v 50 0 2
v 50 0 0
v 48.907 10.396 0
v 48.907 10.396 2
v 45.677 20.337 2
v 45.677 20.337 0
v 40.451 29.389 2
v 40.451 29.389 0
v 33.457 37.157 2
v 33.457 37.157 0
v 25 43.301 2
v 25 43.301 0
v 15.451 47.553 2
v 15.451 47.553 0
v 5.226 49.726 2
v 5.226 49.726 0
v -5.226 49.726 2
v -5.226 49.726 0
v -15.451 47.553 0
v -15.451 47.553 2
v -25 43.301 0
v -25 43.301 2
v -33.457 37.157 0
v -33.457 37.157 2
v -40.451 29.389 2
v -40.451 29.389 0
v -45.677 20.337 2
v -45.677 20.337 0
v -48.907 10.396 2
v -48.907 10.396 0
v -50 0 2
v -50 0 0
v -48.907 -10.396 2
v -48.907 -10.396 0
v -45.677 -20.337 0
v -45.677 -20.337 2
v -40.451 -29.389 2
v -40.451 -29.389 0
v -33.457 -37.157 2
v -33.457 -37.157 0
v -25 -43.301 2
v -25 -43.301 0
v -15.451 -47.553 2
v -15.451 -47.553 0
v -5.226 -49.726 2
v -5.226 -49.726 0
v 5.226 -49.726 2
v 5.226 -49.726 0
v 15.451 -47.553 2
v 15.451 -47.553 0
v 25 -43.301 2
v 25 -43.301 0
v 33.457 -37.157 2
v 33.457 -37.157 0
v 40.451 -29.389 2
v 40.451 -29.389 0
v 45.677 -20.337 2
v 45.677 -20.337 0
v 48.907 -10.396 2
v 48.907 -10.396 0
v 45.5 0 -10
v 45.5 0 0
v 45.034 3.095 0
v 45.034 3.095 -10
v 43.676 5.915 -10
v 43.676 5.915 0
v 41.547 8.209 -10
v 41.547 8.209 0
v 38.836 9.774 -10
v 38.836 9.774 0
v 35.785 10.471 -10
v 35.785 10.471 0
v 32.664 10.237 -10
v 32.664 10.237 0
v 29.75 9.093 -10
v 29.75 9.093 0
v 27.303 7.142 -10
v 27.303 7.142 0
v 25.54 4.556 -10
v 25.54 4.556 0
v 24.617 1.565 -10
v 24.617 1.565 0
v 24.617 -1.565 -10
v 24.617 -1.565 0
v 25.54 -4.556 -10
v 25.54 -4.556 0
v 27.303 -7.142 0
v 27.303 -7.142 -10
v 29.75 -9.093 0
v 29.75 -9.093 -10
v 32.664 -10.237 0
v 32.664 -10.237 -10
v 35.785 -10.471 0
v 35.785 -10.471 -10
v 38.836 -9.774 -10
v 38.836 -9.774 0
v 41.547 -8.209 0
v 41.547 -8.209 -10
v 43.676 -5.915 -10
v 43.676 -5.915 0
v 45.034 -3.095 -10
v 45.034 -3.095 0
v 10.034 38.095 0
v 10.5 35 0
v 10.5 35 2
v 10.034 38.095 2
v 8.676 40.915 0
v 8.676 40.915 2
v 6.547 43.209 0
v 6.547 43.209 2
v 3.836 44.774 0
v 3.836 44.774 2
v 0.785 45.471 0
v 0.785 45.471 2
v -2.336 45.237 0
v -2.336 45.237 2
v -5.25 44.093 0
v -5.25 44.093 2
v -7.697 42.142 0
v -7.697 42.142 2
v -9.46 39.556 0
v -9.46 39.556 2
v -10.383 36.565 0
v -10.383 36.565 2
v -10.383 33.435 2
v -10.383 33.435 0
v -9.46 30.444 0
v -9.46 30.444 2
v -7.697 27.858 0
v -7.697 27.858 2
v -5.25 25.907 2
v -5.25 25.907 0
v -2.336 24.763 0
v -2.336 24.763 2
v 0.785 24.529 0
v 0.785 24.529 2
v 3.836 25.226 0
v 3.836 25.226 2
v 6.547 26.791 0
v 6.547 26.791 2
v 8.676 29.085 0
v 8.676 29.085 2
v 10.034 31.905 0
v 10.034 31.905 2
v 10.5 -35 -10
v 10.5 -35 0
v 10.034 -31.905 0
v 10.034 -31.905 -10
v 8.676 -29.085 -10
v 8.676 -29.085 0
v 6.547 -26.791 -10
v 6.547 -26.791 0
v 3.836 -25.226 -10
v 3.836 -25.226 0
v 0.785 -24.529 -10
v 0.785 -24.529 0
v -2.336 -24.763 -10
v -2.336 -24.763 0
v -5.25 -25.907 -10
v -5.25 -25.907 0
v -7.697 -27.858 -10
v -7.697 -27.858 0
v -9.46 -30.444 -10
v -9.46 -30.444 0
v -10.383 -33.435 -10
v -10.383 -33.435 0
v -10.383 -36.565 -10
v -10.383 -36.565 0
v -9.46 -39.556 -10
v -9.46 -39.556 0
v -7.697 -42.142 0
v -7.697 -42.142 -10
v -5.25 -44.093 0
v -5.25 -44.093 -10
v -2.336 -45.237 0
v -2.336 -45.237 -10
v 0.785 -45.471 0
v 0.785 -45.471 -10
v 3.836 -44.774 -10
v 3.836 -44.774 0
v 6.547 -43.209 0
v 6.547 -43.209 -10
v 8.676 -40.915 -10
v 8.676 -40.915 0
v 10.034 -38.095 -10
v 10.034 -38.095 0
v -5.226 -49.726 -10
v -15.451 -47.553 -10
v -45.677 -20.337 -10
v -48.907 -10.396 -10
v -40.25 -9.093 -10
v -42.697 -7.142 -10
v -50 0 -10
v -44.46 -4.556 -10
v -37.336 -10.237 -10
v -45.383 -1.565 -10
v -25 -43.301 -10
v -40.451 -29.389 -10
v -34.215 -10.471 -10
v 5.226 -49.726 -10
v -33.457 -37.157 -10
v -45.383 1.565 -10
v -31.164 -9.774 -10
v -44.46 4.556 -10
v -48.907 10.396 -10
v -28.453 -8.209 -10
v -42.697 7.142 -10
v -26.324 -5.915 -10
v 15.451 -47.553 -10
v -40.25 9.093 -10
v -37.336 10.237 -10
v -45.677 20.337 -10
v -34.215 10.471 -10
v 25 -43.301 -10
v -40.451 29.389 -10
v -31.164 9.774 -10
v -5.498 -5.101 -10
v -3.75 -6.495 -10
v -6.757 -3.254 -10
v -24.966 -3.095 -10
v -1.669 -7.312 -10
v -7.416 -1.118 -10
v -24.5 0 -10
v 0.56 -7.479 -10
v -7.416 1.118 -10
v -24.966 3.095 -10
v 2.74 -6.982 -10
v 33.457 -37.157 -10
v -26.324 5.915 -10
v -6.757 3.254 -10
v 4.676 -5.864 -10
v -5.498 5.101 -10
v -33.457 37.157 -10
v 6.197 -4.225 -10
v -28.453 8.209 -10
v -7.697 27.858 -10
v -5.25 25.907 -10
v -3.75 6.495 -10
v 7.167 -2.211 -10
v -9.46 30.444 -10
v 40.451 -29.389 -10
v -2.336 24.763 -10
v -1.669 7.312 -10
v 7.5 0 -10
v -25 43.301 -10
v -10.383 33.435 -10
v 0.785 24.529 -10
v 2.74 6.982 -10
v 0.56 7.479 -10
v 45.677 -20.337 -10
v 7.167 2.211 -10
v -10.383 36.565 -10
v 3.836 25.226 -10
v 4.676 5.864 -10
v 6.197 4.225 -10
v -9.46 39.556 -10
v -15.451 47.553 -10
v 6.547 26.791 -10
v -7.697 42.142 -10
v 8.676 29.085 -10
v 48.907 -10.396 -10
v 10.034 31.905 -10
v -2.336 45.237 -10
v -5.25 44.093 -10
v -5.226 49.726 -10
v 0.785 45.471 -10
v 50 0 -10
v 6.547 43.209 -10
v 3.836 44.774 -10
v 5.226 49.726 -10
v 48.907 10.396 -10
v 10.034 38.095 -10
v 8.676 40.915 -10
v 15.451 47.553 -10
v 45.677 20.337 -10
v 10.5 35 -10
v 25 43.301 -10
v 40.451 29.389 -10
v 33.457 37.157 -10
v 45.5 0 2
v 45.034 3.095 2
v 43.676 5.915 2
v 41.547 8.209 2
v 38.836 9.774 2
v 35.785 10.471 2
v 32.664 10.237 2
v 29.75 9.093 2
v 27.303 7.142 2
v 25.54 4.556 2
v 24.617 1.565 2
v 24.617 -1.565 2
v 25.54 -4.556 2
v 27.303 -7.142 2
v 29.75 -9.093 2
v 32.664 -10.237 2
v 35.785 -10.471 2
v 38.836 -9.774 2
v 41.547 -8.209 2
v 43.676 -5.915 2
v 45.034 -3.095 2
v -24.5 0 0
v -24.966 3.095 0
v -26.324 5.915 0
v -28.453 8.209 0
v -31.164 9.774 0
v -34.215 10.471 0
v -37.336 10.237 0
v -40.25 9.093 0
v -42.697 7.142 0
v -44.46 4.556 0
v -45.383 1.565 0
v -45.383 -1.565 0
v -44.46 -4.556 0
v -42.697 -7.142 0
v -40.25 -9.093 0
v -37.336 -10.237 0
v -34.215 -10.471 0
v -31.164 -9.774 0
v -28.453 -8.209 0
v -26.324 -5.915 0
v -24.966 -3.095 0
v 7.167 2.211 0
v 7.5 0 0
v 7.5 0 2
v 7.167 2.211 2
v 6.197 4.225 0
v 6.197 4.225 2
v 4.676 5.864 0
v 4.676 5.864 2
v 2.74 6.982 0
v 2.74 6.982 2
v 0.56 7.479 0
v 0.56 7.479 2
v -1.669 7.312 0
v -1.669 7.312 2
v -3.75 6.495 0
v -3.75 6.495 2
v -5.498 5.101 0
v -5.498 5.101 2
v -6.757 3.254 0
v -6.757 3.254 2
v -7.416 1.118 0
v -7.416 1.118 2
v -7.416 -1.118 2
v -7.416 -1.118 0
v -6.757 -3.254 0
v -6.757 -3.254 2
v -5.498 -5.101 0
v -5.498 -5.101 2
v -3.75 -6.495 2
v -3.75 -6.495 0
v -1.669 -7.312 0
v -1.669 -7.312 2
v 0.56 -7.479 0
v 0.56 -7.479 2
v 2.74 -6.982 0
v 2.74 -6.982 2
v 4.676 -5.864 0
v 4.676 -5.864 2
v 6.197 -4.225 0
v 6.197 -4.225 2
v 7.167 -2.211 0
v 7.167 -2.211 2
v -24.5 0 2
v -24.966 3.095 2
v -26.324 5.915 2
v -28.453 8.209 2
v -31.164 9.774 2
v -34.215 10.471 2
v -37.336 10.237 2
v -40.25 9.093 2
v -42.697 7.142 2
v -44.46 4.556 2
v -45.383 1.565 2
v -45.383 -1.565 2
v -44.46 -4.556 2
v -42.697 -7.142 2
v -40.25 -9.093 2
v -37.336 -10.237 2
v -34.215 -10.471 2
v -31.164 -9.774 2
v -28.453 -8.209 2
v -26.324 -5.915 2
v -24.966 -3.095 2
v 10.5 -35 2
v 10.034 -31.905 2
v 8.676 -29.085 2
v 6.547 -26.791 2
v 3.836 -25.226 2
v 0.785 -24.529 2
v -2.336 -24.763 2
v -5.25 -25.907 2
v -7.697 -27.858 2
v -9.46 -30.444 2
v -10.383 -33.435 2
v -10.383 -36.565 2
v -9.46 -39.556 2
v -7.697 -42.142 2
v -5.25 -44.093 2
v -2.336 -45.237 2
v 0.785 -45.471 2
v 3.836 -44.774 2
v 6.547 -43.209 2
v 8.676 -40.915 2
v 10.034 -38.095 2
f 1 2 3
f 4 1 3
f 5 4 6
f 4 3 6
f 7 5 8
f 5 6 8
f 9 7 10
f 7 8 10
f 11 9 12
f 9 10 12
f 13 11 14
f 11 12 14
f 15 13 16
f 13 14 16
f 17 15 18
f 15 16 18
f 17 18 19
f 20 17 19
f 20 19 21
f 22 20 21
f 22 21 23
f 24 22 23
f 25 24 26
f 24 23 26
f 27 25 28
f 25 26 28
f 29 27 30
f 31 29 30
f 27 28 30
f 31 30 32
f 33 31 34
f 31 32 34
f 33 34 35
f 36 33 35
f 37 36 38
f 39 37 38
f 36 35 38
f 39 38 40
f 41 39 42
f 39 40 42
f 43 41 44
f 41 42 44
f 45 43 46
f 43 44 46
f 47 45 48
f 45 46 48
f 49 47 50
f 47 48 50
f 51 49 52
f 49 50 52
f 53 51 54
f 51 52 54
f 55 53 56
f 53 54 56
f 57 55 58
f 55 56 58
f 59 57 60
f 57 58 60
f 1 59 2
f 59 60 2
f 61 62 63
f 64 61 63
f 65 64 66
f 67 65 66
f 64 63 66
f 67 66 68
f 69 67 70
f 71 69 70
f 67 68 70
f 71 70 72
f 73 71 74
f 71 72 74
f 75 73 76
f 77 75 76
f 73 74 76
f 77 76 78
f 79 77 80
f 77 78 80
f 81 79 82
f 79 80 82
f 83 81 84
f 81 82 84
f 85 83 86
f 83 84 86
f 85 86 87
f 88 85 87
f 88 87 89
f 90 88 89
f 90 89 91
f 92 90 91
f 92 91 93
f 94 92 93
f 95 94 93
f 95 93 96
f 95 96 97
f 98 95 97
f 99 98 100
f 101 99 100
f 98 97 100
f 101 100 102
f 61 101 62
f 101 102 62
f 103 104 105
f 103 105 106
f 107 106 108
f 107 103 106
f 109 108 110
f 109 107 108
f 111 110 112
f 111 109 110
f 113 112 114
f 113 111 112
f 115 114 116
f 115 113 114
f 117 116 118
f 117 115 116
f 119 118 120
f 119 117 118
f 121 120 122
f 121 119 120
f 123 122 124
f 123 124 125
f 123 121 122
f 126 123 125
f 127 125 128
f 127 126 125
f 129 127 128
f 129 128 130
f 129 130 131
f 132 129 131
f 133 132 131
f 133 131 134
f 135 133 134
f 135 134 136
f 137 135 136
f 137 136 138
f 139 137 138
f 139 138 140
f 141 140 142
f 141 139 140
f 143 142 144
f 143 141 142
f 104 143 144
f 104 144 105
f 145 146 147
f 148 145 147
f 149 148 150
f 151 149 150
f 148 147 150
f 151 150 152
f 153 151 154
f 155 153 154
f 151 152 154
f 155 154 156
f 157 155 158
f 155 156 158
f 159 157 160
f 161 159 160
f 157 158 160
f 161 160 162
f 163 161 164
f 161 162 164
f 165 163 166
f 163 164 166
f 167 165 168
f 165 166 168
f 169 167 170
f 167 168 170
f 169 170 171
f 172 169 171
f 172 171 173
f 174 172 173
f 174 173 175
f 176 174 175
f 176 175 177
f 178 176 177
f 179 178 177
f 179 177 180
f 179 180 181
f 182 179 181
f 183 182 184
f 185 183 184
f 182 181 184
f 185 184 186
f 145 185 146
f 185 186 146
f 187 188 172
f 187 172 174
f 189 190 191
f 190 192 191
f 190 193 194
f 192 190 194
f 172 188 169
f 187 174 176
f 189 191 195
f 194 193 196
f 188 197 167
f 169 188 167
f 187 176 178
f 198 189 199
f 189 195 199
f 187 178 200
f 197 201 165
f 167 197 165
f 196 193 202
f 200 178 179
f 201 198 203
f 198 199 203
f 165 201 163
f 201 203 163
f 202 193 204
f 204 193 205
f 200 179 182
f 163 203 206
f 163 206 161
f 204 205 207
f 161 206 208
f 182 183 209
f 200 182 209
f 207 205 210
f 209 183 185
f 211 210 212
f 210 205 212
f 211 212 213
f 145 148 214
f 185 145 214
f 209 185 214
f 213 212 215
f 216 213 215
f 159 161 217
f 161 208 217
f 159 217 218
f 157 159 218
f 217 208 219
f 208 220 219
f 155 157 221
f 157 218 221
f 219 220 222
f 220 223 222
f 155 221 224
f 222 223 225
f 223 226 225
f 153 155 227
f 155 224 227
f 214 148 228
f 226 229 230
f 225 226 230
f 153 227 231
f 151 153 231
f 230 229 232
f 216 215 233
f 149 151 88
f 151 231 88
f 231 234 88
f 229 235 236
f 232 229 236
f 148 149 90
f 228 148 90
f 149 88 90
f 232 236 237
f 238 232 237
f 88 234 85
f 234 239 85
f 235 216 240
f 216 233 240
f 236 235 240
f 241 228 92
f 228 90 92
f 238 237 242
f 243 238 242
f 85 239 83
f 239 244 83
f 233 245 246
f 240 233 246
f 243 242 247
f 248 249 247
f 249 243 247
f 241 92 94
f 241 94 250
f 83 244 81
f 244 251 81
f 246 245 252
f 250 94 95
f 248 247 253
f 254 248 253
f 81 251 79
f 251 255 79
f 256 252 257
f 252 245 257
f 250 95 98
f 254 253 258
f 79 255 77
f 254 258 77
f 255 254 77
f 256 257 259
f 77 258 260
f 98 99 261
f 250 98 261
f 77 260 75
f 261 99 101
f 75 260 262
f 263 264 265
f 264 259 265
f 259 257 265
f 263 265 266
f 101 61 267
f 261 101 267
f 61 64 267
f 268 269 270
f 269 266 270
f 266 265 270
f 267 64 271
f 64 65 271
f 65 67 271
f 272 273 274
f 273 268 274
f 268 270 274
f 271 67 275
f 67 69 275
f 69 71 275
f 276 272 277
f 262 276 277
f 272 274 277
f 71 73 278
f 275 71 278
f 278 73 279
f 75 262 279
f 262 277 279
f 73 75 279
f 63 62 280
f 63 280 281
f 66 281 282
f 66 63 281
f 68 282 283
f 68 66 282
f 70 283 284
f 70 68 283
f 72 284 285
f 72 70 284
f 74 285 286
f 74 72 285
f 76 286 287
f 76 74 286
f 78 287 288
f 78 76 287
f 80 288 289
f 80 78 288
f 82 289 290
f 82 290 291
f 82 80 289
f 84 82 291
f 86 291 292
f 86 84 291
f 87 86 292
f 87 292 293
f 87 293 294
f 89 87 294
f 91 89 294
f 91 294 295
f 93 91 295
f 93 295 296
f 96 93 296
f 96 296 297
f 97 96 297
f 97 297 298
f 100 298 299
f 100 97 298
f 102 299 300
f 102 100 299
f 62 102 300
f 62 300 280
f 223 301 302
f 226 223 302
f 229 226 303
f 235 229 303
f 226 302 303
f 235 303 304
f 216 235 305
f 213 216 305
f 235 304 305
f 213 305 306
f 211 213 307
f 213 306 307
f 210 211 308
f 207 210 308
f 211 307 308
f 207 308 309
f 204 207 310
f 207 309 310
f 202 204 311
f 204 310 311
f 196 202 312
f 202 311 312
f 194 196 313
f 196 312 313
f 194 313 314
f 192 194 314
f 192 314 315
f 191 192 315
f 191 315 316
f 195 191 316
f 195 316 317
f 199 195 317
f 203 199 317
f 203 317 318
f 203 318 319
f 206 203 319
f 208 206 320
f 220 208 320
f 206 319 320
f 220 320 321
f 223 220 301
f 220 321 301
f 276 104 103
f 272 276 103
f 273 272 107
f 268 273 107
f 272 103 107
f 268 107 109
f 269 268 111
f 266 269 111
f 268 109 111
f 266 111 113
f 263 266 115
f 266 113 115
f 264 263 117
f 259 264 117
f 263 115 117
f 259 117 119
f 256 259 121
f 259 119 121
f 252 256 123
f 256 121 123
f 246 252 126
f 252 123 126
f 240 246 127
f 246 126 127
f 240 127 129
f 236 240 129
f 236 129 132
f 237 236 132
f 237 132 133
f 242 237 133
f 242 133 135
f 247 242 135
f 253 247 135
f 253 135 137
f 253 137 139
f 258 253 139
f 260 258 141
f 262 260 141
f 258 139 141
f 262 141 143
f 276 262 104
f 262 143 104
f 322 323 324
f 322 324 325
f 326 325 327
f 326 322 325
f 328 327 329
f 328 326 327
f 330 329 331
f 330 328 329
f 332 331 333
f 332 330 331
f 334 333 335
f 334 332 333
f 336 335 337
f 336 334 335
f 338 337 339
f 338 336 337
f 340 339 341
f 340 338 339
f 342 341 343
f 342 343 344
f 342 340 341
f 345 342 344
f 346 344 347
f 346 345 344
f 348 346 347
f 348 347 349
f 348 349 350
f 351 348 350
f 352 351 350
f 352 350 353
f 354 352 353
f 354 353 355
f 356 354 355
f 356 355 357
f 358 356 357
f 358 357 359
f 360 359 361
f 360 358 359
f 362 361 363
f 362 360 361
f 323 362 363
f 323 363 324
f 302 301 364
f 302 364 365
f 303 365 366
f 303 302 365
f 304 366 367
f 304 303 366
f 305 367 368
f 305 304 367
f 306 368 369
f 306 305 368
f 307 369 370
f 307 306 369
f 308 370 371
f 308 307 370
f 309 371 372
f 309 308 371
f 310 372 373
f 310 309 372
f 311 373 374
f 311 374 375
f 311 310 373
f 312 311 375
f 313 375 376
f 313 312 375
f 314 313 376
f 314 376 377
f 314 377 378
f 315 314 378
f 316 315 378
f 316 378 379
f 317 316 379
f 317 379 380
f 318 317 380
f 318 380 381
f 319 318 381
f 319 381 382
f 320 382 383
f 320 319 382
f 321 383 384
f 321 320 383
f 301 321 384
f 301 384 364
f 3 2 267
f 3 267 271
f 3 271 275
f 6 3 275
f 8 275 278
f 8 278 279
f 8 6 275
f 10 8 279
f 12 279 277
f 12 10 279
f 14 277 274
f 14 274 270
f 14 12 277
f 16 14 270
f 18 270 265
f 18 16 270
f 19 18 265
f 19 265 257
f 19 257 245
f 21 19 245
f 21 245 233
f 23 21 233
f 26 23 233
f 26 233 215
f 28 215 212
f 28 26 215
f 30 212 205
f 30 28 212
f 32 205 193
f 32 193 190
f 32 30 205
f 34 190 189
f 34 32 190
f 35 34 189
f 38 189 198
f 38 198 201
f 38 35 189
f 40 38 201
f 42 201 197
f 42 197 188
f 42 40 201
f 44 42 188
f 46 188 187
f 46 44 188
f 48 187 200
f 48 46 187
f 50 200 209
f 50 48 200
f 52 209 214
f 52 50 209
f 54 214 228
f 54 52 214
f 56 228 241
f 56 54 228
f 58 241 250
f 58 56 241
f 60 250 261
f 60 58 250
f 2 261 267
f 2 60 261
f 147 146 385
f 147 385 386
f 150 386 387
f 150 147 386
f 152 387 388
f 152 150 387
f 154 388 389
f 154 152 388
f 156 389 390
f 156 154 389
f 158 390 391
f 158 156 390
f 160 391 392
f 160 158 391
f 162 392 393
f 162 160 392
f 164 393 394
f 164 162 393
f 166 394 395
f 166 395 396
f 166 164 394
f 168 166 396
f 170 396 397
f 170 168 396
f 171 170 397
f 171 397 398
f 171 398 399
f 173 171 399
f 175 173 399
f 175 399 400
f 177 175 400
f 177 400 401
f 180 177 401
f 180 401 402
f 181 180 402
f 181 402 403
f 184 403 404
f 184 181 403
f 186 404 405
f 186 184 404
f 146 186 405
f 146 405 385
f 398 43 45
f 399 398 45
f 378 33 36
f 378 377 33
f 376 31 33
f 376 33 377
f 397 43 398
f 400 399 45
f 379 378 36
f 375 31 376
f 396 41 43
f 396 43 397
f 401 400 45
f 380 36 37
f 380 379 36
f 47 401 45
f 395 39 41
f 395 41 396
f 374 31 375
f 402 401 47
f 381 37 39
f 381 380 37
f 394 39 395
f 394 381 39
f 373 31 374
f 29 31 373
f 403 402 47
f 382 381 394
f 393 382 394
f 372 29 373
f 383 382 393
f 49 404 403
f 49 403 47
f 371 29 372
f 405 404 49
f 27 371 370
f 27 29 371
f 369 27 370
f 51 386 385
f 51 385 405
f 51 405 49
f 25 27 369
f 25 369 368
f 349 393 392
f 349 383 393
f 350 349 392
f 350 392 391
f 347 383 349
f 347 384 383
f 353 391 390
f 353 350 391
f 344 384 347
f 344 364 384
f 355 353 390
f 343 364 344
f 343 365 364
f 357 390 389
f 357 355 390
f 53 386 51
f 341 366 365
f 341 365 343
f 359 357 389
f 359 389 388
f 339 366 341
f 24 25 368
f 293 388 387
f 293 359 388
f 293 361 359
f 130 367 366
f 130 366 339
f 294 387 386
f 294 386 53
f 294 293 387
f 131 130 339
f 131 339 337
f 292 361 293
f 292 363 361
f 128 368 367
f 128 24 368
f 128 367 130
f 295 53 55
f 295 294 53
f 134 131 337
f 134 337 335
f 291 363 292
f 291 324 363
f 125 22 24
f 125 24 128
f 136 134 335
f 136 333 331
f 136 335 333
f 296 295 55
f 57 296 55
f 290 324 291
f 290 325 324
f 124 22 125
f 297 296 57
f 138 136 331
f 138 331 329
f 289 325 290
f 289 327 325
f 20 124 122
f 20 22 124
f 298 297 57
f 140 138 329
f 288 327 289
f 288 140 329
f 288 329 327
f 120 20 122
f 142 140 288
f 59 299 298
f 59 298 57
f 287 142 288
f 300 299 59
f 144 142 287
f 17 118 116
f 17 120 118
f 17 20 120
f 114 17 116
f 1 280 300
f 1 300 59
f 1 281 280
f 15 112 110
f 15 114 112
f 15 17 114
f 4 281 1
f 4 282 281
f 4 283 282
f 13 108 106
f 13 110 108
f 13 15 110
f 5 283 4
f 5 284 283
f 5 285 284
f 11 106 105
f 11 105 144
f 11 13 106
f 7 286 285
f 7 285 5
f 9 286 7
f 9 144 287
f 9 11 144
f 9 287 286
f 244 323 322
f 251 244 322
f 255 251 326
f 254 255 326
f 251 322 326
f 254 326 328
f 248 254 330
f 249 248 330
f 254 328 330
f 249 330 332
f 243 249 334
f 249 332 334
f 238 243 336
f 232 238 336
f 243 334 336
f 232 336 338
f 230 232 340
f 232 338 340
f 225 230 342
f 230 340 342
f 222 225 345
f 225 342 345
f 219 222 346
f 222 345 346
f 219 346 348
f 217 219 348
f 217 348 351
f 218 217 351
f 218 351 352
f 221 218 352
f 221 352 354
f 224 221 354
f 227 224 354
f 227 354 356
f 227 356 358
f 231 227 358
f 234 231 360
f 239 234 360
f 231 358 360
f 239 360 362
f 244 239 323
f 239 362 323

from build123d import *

# Parameters (mm, degrees)
F0_R     = 50
F0_R_2   = 10.5
F0_R_3   = 7.5
F1_DEPTH = 10
F2_DEPTH = 2


with BuildPart() as f1:
    # F0 (on Top) → F1 (new body)
    with BuildSketch(Plane.XY):
        Circle(F0_R)
        with Locations((0, -35)):
            Circle(F0_R_2, mode=Mode.SUBTRACT)
        with Locations((-35, 0)):
            Circle(F0_R_2, mode=Mode.SUBTRACT)
        Circle(F0_R_3, mode=Mode.SUBTRACT)
        with Locations((35, 0)):
            Circle(F0_R_2, mode=Mode.SUBTRACT)
        with Locations((0, 35)):
            Circle(F0_R_2, mode=Mode.SUBTRACT)
    extrude(amount=-F1_DEPTH)

    # F0 (on Top) → F2 (join)
    with BuildSketch(Plane.XY):
        Circle(F0_R)
        with Locations((0, -35)):
            Circle(F0_R_2, mode=Mode.SUBTRACT)
        with Locations((-35, 0)):
            Circle(F0_R_2, mode=Mode.SUBTRACT)
        Circle(F0_R_3, mode=Mode.SUBTRACT)
        with Locations((35, 0)):
            Circle(F0_R_2, mode=Mode.SUBTRACT)
        with Locations((0, 35)):
            Circle(F0_R_2, mode=Mode.SUBTRACT)
    extrude(amount=F2_DEPTH)


solid = f1.part
